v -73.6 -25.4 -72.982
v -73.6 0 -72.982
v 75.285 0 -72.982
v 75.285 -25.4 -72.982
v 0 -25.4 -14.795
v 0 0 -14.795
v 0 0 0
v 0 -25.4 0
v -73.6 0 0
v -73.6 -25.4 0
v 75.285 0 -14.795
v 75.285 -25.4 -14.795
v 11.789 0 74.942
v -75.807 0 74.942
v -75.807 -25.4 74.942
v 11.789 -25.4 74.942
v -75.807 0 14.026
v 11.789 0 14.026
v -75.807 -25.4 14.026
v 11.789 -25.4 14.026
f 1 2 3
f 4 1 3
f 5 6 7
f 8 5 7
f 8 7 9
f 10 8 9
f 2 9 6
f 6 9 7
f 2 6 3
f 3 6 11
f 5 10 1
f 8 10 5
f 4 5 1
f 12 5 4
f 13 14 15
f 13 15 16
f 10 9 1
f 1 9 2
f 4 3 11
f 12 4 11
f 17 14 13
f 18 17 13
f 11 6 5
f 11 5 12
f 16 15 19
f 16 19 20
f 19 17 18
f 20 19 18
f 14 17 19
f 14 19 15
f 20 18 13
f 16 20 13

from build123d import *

# Parameters (mm, degrees)
F0_W     = 87.596503
F0_H     = 60.916185
F1_DEPTH = 25.4
F2_W     = 75.285435
F2_H     = 58.18655
F3_DEPTH = 25.4


with BuildPart() as f1:
    # F0 (on Front) → F1 (new body)
    with BuildSketch(Plane.XZ):
        with Locations((-32.008857, 44.483959)):
            Rectangle(F0_W, F0_H)
    extrude(amount=F1_DEPTH)


with BuildPart() as f3:
    # F2 (on Front) → F3 (new body)
    with BuildSketch(Plane.XZ):
        Polygon((-73.600315, 0), (-73.600315, -72.981529), (0, -72.981529), (0, -14.794979), (0, 0), align=None)
        with Locations((37.642717, -43.888254)):
            Rectangle(F2_W, F2_H)
    extrude(amount=F3_DEPTH)


solid = Compound([f1.part, f3.part])
